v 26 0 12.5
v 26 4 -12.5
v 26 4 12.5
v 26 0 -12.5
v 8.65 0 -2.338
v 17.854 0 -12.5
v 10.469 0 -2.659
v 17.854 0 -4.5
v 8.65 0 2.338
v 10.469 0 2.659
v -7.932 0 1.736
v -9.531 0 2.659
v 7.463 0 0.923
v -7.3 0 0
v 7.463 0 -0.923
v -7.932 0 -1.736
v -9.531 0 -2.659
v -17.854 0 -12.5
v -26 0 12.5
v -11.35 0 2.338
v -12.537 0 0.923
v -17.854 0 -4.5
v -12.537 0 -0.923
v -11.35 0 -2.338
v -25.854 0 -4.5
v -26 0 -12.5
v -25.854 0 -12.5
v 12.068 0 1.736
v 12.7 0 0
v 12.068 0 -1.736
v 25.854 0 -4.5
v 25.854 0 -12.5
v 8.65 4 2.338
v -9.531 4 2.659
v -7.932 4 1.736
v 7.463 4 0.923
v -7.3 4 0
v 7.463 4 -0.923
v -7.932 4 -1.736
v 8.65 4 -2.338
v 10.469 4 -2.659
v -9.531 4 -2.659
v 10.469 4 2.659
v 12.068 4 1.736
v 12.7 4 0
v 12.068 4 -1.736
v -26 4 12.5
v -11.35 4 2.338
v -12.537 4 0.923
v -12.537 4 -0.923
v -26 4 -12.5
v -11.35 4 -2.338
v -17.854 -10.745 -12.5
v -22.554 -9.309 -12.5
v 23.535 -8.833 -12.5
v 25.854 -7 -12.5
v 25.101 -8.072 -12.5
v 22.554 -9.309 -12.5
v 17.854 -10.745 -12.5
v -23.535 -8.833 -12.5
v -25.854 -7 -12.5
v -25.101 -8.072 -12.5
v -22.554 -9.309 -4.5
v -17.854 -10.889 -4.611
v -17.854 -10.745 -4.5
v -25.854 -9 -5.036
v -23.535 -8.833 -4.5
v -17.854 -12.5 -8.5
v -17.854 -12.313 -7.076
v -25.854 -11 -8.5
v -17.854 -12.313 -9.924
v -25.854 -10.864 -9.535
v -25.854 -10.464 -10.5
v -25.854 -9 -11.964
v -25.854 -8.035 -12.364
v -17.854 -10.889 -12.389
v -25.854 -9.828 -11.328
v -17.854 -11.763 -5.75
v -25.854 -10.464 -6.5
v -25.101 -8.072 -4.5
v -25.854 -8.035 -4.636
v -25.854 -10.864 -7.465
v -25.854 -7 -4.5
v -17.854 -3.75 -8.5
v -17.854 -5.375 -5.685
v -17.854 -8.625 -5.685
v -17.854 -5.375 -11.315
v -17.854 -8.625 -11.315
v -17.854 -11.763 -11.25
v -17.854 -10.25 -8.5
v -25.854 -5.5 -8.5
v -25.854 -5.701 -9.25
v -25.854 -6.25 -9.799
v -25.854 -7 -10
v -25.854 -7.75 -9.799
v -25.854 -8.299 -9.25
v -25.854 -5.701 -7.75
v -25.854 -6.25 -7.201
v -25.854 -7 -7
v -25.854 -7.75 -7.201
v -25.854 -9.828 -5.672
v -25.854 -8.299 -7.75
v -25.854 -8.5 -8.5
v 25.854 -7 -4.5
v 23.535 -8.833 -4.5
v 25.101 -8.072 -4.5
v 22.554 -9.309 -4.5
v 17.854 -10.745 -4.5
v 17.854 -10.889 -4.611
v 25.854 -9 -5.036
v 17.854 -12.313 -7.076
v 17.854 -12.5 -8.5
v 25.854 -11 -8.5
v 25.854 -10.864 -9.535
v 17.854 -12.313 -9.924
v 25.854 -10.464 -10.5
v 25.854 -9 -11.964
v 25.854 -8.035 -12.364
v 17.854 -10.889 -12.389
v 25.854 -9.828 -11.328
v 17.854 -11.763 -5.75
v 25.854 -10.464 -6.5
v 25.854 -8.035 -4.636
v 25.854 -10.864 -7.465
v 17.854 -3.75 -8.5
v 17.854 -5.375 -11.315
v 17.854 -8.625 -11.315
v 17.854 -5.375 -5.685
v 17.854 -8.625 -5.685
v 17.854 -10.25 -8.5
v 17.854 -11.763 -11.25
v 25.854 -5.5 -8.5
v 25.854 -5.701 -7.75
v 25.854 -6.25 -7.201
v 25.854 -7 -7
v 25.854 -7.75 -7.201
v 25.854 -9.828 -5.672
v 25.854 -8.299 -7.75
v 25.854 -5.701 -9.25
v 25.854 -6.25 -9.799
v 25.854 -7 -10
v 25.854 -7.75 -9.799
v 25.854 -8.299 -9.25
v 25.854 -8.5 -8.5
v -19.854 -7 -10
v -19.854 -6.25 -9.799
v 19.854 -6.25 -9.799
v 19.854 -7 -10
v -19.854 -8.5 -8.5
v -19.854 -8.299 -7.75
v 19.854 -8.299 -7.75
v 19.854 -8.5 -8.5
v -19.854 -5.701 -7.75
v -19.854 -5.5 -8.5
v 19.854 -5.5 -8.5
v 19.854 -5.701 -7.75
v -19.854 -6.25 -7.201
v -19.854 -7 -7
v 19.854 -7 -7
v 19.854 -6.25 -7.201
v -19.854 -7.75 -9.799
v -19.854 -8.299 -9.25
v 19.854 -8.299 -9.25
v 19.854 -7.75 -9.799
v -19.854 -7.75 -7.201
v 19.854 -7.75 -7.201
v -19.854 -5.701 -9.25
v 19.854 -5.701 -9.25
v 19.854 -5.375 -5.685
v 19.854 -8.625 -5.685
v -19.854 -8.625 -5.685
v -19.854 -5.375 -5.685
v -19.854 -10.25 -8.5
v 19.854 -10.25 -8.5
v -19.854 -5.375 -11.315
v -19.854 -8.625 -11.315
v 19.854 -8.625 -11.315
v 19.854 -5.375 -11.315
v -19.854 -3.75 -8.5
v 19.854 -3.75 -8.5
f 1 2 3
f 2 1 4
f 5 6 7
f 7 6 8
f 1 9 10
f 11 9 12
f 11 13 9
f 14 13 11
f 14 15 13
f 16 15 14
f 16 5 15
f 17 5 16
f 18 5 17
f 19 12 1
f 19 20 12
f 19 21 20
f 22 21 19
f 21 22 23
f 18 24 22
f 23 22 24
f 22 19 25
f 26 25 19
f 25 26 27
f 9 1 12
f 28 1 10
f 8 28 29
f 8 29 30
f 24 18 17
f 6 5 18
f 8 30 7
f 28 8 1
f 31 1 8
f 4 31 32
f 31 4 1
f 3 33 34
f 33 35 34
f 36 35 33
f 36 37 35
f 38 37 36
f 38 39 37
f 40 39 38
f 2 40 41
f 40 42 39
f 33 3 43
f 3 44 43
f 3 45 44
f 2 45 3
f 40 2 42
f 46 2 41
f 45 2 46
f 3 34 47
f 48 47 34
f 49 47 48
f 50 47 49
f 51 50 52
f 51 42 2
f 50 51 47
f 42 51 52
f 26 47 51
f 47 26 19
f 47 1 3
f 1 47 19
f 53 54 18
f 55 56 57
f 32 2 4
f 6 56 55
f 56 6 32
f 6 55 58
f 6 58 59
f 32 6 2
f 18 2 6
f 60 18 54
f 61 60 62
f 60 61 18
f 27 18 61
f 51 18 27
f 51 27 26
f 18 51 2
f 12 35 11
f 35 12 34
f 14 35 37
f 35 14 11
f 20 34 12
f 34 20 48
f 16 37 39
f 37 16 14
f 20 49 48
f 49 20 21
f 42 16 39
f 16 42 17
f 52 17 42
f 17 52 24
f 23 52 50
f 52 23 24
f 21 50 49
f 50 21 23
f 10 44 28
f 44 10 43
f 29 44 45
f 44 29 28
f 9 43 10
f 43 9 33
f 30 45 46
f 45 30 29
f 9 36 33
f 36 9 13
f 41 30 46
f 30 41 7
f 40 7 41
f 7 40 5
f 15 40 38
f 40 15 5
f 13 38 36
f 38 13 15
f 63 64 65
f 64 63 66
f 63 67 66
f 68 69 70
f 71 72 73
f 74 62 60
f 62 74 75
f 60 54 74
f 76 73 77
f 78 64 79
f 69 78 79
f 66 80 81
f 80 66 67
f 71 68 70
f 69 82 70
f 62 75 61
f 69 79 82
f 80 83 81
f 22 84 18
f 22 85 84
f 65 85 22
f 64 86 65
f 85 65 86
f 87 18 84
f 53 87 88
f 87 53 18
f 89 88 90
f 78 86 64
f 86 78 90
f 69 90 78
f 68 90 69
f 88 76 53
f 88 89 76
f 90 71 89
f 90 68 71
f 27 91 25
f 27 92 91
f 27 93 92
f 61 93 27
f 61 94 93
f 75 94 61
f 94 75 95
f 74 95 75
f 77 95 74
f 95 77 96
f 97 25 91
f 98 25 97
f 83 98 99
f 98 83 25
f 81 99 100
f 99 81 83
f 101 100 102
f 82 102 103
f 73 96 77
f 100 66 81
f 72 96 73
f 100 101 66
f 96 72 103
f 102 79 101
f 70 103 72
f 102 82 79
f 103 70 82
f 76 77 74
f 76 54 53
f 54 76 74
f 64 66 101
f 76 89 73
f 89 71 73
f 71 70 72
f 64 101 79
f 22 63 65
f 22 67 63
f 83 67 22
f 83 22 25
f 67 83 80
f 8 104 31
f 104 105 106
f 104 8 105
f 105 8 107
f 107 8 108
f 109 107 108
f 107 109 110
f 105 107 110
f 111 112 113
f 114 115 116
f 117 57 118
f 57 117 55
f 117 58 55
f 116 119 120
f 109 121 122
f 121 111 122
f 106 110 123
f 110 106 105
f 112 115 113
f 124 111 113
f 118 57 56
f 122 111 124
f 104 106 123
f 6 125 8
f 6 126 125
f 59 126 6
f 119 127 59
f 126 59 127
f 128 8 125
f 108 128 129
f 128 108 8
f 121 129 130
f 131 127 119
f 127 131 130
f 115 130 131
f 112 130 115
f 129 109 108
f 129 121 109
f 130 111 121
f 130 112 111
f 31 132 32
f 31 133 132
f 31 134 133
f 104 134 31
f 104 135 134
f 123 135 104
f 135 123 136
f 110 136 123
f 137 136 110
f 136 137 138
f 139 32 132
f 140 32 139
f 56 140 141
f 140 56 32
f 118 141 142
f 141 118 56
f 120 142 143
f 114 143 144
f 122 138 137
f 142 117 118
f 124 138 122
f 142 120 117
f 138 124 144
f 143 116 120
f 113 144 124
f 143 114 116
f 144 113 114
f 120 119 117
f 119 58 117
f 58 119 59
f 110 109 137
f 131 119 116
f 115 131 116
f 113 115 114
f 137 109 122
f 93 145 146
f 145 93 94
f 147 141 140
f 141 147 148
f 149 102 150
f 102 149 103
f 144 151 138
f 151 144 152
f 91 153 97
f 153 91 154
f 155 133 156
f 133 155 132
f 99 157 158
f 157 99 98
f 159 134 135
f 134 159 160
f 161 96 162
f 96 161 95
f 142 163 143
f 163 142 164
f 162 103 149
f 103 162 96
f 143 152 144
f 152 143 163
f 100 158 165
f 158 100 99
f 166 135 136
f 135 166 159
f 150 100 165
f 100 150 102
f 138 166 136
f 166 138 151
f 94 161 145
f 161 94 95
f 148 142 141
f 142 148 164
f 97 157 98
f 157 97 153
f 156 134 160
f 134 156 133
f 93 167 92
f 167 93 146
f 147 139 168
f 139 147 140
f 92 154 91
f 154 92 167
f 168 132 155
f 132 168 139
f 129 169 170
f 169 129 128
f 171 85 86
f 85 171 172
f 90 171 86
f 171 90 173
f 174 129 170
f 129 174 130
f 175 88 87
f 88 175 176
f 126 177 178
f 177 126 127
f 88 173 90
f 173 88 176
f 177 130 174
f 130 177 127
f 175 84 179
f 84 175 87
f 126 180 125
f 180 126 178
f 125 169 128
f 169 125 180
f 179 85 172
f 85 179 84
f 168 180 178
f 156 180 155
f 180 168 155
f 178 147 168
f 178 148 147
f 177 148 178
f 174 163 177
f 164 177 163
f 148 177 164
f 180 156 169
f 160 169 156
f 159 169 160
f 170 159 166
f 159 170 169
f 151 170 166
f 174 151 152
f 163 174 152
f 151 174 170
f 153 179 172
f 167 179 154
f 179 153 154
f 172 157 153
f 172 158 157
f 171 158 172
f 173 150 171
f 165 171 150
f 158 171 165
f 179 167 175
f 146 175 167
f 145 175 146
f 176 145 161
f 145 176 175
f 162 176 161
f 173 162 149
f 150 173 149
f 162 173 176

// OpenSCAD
// file: configuration.scad
// Increase this if your slicer or printer make holes too tight.
extra_radius = 0.0;

// OD = outside diameter, corner to corner.
m3_nut_od = 6.1;
m3_nut_radius = m3_nut_od/2 + 0.2 + extra_radius;

// Major diameter of metric 3mm thread.
m3_major = 2.85;
m3_radius = m3_major/2 + extra_radius;
m3_wide_radius = m3_major/2 + 0.2 + extra_radius;

// NEMA17 stepper motors.
motor_shaft_diameter = 5;
motor_shaft_radius = motor_shaft_diameter/2 + extra_radius;

// Frame brackets.
thickness = 3.6;
// file: arm-mount.scad
include <configuration.scad>;

ratio= 1.39;
separation = 37.2*ratio;
radius = 33*ratio;
height = 8;
cone_r1 = height/2;
cone_r2 = 5.5;

echo("Separation= ", separation);

module arm_mount_raw() {
	difference() {
		union() {
	   		translate([-separation/2,-10,-height/2]) cube([separation, 2, height]);		
			intersection() {
		   		cube([separation, 20, height], center=true);
			    union() {
		          for (s = [-1, 1]) scale([s, 1, 1]) {
		            translate([separation/2-4, 0, 0]) rotate([0, 90, 0])
		              cylinder(r1=cone_r2, r2=cone_r1, h=8, center=true, $fn=24);
		            translate([separation/2-4, -5, 0])
		              cube([8, 10, height], center=true);
		          }
				}
			}
	  }
	  rotate([0, 90, 0])
	      cylinder(r=1.5, h=separation+1, center=true, $fn=12);
	  rotate([90, 0, 90])
	      cylinder(r=m3_nut_radius, h=separation-12, center=true, $fn=6);
	}
}

module arm_mount() {
	translate([0,10,0]) arm_mount_raw();
}

arm_mount();
// file: carriage_plate_standard_c14005_rev_2.scad
// MakerSlide Component
// http://www.makerslide.com
// c14005_rev_2
// Standard Wheel Carriage Plate
// Original by Barton Dring
// OpenSCAD model by Mike Sheldrake

centeredCarriagePlate();

module centeredCarriagePlate() {
	translate([-90/2,-160/2,0]) standard_wheel_carriage_plate();
}

module standard_wheel_carriage_plate(thickness=3.175) {
color([175/255,178/255,183/255])
difference() {

// 90mm by 160mm plate 
// 3.175mm thick by default,
// but you can pass a different thickness to this module
cube([90,160,3.175],center=false);

// 5mm diam. holes
for(i=[
  [12.7,10],
  [12.7,30],
  [12.7,70],
  [12.7,80],
  [12.7,90],
  [12.7,112.3],
  [12.7,130],
  [12.7,150],
  [35,10],
  [35,60],
  [35,80],
  [35,100],
  [35,150],
  [45,70],
  [45,90],
  [55,10],
  [55,60],
  [55,80],
  [55,100],
  [55,150],
  [77.3,30],
  [77.3,70],
  [77.3,90],
  [77.3,112.3],
  [77.3,130],

  //These are 5mm holes in the 7mm hole spots that we will do next.
  //For some reason including them here too makes the OpenCSG display look right.
  //Not needed for CGAL render though.
  [12.7,47.7],
  [45,47.7],
  [77.3,10],
  [77.3,47.7],
  [77.3,80],
  [77.3,150]

  ]) { translate([i[0],i[1],-0.2]) cylinder(h=thickness+1,r=5/2,center=false); }

// 7mm diam. holes 
for(i=[
  [12.7,47.7],
  [45,47.7],
  [77.3,10],
  [77.3,47.7],
  [77.3,80],
  [77.3,150]
  ]) { translate([i[0],i[1],-0.2]) cylinder(h=thickness+1,r=7/2,center=false); }

// rounded corners on plate 
for(i=[
  [0,0,0],
  [90,160,180],
  [90,0,90],
  [0,160,270]
  ]
  ) {
	translate([i[0],i[1],0]) rotate(a=[0,0,i[2]]) translate([10,10,-0.1]) rotate(a=[0,0,180]) difference() {
		cube([11,11,thickness+1],center=false);
		translate([0,0,-0.1]) cylinder(h=thickness+2,r=10,center=false);
		}
	}
}
}
// main file
use <carriage_plate_standard_c14005_rev_2.scad>
use <arm-mount.scad>

w= 52;
h= 25;
thickness=4;
offset= sin(30) * w/2;
sidel= sin(30) * w;

module armPlate(w=w, h=h) {
	difference() {
		// base plate
		cube([w,h,thickness], center=true);
		
		// attachment holes
		#translate([-10,0,-thickness/2-4]) cylinder(r=5/2+0.2, h= thickness+5);
		#translate([10,0,-thickness/2-4]) cylinder(r=5/2+0.2, h= thickness+5);
	}
}

module backPlate() {
	union() translate([0,0,-thickness/2]){
		armPlate();
		translate([0,-h/2+8/2,-1]) rotate([90,0,0]) arm_mount();
	}
}

module sidePlate() {
	aw1= tan(60)*sidel;
	sl1= sidel-1;
	sidel2= sin(30) * w/2;
	aw2= tan(60)*(sidel2);
	sl2= sidel2;
	aw3= 19;
	sl3= 5;
	union() {
		translate([0,0,-thickness/2]) armPlate(w=aw1);

		// vertical supports
		translate([-aw1/2+thickness/2,-h/2+8/2,sl1/2]) cube([thickness, 8, sl1], center=true);
		translate([0,-h/2+8/2,sl2/2]) cube([thickness, 8, sl2], center=true);
		translate([aw3,-h/2+8/2,sl3/2]) cube([thickness+3, 8, sl3], center=true);

		translate([0,0,offset]) rotate([0,30,0]) {
			translate([0,-h/2+8/2,-1]) rotate([90,0,0]) arm_mount();
			// extra thickness for base
			translate([0,-h/2+8/2,-2]) cube([w-4,8,2], center=true);
		}
	}
}

rotate([90,0,0]) backPlate();

// left
//rotate([-90,0,0]) mirror([0,1,0]) sidePlate();

//right
//rotate([90,0,0]) sidePlate();

//%translate([0,0,-3.175-thickness]) rotate([0,0,-90]) translate([-90/2,-160/2,0]) standard_wheel_carriage_plate();
